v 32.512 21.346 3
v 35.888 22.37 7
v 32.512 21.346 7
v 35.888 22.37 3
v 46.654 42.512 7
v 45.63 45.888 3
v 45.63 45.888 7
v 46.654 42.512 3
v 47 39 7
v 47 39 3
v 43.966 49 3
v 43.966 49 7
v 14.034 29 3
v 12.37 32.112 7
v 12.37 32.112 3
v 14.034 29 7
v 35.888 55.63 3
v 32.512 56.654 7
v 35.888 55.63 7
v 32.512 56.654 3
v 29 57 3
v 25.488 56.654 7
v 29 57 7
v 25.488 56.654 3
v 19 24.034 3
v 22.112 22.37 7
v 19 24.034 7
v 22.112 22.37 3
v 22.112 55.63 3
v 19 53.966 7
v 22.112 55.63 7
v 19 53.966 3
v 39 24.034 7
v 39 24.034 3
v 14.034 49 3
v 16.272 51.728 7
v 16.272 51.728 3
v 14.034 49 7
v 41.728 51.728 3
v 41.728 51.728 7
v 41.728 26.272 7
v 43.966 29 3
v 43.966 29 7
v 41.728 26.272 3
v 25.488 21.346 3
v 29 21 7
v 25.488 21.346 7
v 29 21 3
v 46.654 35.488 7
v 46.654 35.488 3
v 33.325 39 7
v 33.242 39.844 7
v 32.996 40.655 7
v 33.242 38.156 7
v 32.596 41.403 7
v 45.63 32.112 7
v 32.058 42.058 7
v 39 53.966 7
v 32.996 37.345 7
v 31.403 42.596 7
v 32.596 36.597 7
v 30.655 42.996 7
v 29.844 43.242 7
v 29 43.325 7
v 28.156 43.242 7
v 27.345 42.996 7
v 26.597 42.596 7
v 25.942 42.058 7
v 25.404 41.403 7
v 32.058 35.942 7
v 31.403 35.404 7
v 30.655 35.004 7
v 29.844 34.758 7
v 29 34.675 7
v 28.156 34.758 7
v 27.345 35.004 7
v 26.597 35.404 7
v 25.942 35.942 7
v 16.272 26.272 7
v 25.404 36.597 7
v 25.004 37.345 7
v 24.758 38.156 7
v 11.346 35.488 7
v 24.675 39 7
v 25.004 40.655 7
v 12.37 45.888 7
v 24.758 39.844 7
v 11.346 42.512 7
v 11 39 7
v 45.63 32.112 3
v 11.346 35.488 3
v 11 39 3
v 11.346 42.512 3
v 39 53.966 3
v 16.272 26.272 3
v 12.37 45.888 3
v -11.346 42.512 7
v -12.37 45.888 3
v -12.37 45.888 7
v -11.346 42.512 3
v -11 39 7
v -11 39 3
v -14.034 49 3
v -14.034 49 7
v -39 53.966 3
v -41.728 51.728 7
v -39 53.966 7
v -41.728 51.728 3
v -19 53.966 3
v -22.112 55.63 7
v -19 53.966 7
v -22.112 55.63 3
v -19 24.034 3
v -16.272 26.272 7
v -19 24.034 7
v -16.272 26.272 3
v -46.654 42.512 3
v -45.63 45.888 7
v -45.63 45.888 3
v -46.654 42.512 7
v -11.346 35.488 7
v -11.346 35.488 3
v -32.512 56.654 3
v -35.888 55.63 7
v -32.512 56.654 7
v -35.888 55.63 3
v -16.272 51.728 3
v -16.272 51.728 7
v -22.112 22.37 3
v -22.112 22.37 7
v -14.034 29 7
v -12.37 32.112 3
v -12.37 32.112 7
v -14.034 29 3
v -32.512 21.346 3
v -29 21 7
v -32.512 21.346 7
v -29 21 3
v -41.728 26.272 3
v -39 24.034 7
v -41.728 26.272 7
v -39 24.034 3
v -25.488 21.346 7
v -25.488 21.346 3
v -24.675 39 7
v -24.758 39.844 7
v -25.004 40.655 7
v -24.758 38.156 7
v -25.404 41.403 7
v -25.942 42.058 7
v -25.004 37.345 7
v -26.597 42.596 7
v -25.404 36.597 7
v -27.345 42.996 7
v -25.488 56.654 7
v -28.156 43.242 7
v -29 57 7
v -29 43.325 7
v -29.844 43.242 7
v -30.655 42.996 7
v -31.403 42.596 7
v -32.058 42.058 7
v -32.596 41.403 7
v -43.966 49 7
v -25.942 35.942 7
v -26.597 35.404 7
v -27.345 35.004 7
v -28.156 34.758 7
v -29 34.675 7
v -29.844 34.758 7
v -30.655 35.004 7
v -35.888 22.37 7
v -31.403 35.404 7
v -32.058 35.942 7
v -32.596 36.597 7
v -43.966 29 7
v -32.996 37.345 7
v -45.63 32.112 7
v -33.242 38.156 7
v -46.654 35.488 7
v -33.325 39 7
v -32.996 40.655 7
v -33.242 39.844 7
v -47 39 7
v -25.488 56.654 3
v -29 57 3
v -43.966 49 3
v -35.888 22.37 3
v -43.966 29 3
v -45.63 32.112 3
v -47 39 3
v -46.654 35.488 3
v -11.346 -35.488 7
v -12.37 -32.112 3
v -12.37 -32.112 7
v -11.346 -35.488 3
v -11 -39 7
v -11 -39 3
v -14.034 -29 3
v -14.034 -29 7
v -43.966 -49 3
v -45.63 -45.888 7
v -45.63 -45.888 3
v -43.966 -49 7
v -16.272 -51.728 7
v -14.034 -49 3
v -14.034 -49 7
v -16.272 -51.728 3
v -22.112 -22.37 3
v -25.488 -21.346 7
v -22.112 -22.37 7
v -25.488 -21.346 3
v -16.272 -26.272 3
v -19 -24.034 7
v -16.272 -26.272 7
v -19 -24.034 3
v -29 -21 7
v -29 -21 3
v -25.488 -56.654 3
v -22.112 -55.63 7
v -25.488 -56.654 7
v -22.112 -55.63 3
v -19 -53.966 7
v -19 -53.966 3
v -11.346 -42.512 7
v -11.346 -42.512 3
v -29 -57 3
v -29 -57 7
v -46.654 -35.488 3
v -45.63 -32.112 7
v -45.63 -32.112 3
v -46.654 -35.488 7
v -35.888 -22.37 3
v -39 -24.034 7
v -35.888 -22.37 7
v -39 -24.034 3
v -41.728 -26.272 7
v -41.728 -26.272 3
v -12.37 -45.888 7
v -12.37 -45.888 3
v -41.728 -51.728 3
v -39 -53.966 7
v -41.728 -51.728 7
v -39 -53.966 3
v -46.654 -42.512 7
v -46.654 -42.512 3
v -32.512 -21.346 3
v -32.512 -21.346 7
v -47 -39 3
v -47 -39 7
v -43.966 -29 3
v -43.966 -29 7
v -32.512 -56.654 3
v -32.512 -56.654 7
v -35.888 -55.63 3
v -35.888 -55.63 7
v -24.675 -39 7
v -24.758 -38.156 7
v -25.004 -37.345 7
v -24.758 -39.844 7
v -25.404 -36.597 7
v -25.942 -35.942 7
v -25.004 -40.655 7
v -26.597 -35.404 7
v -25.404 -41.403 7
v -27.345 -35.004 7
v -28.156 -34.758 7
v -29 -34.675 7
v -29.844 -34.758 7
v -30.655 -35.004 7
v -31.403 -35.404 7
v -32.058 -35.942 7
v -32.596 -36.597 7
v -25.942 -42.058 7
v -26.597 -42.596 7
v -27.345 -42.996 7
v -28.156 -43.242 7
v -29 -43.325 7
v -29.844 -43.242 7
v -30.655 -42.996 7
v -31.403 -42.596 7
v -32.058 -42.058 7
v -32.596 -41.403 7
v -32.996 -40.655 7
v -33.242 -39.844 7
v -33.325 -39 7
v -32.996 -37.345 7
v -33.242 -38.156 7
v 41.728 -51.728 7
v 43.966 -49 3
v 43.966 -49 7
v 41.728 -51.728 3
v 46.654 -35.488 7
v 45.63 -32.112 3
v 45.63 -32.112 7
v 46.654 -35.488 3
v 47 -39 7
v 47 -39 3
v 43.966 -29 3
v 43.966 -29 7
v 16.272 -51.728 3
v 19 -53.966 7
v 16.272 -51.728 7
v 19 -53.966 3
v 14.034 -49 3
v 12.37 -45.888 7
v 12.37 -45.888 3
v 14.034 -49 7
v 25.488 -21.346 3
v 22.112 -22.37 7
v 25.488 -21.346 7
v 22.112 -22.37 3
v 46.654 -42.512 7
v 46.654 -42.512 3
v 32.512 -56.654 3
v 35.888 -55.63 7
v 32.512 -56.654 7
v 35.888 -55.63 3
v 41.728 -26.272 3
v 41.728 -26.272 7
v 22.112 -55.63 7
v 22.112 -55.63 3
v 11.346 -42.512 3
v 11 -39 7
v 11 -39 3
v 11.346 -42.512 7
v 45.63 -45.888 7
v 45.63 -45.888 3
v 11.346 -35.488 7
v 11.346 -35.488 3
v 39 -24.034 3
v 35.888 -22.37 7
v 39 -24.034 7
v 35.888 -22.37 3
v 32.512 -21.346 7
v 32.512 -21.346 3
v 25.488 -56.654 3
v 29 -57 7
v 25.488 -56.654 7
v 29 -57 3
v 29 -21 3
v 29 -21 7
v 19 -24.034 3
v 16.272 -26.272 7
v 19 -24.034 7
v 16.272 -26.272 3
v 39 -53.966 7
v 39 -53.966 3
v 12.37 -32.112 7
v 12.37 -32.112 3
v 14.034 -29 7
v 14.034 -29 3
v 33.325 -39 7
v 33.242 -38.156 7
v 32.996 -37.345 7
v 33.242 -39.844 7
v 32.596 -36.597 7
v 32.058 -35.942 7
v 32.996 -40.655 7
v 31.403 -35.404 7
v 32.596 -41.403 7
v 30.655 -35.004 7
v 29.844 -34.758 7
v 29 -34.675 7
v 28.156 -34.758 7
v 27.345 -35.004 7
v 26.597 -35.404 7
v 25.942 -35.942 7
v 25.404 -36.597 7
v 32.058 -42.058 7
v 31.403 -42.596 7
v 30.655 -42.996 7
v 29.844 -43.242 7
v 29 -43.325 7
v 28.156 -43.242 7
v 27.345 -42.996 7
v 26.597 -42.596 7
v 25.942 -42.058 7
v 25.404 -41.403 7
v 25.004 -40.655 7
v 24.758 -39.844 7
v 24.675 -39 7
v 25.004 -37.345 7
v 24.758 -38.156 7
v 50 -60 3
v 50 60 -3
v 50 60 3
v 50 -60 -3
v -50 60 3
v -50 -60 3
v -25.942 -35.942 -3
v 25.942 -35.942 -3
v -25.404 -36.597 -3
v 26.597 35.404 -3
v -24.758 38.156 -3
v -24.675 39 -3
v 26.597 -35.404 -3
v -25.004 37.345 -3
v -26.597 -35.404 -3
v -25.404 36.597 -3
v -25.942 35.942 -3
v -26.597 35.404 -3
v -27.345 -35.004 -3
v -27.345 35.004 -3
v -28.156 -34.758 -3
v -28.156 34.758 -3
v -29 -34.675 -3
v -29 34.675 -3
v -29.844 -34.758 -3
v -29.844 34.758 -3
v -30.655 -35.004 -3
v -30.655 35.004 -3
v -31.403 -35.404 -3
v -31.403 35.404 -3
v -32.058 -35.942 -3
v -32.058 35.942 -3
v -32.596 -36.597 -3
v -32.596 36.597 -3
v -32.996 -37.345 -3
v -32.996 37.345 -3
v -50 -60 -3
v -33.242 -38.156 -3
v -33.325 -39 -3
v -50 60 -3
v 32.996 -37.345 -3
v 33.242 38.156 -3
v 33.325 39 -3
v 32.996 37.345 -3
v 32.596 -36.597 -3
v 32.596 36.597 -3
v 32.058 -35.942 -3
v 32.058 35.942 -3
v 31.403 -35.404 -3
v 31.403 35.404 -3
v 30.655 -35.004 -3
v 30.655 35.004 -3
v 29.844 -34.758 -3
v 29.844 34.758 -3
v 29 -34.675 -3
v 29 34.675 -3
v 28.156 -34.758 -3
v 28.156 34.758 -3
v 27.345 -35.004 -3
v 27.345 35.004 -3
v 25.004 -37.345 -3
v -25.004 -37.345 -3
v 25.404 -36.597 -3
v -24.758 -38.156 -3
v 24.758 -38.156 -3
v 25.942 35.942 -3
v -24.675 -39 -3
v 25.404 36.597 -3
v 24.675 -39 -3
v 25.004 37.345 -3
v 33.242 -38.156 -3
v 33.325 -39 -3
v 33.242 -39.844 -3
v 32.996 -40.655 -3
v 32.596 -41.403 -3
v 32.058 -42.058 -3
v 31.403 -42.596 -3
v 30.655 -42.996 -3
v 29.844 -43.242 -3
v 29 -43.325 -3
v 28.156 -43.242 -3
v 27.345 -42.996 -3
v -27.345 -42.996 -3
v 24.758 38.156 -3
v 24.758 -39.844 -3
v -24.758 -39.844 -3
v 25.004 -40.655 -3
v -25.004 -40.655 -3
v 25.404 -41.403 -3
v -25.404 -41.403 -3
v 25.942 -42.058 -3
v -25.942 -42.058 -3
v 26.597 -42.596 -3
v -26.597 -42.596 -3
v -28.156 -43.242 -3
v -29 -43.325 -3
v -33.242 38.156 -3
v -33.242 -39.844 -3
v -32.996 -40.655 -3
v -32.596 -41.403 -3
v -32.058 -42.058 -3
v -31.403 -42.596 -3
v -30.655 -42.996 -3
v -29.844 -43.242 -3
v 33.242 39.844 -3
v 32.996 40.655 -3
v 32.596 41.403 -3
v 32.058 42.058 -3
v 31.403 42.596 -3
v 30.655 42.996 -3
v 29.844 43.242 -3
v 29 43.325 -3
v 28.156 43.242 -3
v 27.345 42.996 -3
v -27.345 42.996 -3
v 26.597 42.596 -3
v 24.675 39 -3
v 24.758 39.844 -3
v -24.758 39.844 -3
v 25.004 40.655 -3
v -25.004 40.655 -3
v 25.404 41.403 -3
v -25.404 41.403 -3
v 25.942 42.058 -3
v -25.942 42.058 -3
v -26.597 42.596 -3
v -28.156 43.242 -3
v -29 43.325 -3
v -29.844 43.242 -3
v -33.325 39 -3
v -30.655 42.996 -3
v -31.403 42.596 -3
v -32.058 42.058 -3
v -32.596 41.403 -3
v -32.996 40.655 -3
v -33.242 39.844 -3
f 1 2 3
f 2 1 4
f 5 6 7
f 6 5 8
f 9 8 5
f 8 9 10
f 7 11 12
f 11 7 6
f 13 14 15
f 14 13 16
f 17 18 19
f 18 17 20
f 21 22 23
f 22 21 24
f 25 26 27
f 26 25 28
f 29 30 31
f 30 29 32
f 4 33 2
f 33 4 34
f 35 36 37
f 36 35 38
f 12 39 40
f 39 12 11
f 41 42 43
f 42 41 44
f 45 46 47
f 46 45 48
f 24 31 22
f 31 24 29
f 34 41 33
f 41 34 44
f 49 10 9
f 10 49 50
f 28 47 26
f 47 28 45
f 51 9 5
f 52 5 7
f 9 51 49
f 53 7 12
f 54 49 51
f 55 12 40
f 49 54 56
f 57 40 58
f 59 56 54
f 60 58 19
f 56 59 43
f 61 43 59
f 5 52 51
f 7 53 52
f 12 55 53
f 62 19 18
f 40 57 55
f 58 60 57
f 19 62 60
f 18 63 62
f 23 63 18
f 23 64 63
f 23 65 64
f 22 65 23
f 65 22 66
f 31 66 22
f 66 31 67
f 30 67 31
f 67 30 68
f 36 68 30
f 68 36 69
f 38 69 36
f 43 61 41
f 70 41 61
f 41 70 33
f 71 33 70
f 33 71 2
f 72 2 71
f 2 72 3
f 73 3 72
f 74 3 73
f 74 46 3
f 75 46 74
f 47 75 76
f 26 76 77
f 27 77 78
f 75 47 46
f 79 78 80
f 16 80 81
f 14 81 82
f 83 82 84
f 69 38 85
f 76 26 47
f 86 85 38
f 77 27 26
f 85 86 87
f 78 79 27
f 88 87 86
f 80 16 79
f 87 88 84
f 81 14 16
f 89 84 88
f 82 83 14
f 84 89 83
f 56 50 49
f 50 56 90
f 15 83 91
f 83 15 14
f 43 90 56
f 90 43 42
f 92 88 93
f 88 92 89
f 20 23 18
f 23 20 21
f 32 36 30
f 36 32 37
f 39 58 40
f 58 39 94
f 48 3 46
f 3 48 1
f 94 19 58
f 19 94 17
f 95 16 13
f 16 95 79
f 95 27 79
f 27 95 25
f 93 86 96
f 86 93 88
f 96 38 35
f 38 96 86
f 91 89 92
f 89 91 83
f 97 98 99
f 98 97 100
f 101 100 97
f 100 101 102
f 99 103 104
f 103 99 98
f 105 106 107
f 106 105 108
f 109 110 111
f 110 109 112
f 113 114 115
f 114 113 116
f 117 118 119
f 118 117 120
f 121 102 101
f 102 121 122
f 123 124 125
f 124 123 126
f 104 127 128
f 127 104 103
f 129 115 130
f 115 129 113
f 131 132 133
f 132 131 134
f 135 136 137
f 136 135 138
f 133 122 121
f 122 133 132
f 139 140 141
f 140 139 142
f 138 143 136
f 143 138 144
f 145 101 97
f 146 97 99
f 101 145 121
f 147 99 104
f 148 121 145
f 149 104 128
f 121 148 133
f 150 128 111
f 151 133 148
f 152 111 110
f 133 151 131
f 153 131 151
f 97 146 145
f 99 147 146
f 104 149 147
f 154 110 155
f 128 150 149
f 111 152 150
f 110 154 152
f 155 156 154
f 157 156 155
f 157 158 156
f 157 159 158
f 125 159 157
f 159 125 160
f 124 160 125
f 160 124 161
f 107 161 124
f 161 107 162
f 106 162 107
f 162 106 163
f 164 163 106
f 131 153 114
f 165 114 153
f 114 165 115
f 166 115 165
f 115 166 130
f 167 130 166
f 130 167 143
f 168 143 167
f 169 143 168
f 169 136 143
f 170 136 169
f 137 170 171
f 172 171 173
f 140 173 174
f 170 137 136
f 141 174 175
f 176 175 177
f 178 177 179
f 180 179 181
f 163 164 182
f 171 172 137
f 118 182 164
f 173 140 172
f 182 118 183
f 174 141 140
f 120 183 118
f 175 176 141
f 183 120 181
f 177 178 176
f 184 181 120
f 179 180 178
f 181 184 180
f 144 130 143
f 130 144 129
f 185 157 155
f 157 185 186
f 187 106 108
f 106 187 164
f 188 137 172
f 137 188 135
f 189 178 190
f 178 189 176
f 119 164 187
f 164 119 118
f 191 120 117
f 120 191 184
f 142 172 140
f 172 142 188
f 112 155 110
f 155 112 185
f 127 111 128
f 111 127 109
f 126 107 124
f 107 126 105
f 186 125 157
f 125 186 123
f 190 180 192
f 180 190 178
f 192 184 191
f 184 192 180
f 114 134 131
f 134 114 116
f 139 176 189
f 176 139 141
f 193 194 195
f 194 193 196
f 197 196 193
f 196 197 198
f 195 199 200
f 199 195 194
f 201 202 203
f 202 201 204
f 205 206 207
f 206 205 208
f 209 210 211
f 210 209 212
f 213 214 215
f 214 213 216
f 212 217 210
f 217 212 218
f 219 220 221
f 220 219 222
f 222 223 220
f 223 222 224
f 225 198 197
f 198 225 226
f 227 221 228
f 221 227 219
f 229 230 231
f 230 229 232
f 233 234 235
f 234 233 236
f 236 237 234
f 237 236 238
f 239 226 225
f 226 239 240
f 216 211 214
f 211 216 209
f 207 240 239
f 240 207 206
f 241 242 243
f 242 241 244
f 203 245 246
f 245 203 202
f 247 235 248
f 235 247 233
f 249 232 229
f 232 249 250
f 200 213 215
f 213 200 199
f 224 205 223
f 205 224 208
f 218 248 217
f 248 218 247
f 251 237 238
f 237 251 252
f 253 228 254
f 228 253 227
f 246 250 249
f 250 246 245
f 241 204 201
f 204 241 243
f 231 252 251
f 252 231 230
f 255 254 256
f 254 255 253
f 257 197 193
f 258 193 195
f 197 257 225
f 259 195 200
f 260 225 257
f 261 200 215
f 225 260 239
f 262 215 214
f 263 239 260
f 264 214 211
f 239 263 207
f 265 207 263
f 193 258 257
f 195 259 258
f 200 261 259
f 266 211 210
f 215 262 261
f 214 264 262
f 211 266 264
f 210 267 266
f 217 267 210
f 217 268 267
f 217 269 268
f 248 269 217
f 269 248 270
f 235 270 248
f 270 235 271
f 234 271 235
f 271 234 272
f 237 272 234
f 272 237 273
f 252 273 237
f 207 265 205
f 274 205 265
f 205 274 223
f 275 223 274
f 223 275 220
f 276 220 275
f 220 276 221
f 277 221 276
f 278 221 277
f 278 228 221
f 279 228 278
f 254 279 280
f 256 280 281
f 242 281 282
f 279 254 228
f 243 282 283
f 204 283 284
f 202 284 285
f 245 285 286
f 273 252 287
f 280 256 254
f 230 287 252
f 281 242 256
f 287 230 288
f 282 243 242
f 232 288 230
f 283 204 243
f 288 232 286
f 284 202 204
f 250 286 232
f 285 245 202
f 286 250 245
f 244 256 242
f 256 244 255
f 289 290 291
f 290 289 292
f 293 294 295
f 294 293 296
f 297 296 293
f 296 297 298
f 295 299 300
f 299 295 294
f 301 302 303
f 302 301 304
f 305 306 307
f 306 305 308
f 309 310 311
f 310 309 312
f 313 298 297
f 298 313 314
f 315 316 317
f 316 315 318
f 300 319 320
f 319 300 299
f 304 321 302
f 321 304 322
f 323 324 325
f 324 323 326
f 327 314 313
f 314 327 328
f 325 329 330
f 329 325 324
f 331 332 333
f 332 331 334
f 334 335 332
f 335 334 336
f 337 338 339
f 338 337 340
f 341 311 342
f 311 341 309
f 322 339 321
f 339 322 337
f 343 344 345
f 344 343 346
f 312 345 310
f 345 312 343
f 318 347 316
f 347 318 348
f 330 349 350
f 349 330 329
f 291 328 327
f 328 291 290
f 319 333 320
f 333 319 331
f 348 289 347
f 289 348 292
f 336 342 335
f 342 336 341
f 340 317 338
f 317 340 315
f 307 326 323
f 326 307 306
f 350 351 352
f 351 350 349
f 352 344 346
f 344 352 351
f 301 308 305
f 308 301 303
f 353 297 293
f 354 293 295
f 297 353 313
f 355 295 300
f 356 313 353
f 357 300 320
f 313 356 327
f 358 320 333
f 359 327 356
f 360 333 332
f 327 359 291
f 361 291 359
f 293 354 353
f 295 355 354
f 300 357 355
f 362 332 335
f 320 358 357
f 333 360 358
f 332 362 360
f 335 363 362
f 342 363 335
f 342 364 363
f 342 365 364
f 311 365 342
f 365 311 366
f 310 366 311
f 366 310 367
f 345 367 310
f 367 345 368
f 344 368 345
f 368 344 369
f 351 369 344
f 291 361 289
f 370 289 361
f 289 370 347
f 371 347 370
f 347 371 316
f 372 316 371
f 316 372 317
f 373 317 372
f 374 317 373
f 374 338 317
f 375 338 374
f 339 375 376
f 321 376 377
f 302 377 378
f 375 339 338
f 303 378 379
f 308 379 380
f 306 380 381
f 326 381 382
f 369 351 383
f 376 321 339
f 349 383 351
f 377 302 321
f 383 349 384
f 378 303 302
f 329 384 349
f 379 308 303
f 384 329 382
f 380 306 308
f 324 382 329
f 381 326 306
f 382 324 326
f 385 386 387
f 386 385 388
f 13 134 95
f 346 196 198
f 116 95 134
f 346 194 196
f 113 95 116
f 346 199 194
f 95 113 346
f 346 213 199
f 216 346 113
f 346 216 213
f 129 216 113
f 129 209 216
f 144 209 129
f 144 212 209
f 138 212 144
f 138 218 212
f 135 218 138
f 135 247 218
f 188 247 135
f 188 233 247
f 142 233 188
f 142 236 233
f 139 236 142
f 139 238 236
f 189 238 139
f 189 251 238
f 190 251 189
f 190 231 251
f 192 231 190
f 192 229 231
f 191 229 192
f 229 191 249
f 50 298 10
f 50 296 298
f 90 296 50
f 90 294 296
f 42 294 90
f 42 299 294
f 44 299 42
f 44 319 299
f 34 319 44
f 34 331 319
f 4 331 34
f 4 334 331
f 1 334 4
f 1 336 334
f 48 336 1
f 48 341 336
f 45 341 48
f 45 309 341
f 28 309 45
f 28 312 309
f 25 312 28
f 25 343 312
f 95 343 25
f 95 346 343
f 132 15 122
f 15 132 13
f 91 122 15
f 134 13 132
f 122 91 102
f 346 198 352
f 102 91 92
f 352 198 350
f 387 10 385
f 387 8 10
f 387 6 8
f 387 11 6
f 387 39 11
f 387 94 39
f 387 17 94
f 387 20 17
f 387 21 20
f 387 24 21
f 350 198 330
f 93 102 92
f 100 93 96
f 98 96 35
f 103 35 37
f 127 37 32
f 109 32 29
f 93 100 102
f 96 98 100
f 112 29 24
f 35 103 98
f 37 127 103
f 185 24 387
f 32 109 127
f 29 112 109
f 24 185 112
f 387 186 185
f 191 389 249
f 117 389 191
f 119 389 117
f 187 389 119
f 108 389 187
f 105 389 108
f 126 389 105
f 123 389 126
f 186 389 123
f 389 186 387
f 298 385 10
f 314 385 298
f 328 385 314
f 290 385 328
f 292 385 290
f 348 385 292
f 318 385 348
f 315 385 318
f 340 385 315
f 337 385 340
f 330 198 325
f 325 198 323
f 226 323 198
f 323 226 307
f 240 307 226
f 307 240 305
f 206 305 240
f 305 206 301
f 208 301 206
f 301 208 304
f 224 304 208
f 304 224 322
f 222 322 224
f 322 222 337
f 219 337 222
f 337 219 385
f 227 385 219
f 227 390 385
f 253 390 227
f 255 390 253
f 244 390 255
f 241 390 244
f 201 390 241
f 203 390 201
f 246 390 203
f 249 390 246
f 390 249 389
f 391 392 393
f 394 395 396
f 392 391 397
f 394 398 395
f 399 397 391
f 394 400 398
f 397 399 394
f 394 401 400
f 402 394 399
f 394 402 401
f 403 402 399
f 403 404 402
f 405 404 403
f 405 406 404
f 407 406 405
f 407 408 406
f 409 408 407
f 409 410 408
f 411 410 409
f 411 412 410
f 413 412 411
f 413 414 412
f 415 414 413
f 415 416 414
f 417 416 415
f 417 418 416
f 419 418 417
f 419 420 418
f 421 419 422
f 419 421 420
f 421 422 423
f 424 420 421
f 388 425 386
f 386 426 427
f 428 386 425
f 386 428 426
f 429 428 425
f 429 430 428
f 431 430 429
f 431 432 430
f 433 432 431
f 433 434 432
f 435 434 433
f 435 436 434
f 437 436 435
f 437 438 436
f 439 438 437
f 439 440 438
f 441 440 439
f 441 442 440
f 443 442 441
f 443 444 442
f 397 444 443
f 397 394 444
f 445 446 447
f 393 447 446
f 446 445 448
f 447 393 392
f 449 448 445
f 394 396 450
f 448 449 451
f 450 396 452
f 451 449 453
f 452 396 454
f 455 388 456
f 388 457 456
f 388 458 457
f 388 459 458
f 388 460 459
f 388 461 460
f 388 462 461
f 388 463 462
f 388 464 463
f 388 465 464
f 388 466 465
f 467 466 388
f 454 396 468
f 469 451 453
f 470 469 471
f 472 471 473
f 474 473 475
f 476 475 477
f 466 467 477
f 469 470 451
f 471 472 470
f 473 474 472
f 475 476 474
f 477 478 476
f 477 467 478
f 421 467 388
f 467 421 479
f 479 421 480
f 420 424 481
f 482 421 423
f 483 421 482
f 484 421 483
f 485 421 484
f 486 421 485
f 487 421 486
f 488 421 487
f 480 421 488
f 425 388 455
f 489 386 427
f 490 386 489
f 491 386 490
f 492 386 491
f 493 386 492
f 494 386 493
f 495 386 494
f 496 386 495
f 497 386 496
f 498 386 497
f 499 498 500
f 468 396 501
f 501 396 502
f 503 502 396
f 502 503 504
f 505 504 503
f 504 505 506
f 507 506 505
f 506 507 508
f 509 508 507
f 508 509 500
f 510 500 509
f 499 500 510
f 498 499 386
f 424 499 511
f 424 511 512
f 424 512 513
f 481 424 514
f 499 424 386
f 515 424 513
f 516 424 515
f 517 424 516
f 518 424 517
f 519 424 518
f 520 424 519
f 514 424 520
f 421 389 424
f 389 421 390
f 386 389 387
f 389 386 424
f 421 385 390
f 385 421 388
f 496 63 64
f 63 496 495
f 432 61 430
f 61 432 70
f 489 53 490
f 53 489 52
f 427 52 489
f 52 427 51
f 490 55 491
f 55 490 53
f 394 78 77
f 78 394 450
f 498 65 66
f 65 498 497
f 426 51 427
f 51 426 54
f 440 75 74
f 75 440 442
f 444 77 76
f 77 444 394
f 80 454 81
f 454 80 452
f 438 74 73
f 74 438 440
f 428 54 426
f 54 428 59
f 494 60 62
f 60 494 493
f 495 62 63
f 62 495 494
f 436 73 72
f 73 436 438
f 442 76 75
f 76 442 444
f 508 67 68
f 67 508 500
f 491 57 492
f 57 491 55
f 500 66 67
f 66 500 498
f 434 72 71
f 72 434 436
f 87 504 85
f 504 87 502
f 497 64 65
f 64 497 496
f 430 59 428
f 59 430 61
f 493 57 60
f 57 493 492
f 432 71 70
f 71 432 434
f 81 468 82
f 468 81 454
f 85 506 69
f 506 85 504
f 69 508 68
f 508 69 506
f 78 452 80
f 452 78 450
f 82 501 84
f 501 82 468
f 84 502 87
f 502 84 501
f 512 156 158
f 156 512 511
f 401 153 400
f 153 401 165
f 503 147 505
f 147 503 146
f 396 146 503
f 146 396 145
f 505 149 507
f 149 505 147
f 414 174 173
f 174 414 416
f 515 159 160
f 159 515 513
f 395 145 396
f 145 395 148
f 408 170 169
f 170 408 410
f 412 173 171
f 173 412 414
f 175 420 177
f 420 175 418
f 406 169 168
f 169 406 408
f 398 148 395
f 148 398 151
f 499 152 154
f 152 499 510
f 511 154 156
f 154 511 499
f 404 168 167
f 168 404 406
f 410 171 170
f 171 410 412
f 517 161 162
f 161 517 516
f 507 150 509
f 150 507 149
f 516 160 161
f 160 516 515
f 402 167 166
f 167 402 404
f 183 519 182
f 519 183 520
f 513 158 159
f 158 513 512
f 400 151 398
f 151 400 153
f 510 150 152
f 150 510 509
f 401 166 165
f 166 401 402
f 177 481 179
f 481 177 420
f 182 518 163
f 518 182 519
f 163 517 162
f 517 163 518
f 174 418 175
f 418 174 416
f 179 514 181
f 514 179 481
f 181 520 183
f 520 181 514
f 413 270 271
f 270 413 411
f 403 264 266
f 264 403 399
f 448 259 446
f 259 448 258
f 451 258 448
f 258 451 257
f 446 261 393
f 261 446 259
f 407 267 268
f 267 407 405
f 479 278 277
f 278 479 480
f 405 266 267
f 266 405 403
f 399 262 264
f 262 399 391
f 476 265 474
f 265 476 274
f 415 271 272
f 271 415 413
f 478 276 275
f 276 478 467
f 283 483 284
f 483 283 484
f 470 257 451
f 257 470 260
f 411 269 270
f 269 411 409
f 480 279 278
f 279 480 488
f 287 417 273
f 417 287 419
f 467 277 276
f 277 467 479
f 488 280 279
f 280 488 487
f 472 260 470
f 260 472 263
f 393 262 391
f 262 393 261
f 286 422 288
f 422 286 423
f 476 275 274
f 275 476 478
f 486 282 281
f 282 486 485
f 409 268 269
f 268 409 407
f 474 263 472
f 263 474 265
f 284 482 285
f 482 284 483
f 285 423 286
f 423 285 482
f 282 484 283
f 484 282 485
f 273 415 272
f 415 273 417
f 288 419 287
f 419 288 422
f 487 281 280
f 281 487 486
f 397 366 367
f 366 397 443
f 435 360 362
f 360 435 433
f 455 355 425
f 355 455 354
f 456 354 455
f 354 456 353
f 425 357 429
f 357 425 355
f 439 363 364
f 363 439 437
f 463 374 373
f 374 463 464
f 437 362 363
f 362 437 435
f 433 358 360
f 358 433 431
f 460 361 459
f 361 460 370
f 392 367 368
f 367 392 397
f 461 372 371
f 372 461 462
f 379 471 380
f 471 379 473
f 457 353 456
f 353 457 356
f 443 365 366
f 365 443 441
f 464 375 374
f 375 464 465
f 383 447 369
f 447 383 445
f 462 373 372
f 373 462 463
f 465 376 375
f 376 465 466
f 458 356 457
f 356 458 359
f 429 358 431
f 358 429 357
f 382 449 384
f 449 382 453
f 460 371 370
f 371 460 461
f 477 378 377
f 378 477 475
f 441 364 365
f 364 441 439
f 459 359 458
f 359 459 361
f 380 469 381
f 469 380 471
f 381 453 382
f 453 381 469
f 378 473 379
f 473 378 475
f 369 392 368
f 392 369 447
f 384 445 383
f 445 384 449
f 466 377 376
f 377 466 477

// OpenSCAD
$fn = 32;

// ----------------------------------------------------------------------
// Anchor pads 100 x 120 x 10
// four corner bosses with anchor holes
// ----------------------------------------------------------------------

// --- parameters (mm) ---
plate = [100, 120, 6];   // base plate size (x, y, z)
pads = 4;                // boss count, one per corner
edge = 21;               // boss centre offset from the plate edge
boss_d = 36;             // boss diameter
boss_h = 4;              // boss height above the base plate
bore_d = 8.4;            // nominal hole diameter from the drawing
print_allowance = 0.25;  // clearance added for printing

// --- derived feature positions (mm) ---
hole_d = bore_d + print_allowance;  // = 8.65   hole diameter as printed
height = plate[2] + boss_h;         // = 10   overall height of the part
corner_x = plate[0] / 2 - edge;     // = 29   boss centre X
corner_y = plate[1] / 2 - edge;     // = 39   boss centre Y
feature_centers = [
  [corner_x, corner_y],
  [-corner_x, corner_y],
  [-corner_x, -corner_y],
  [corner_x, -corner_y]
];   // boss centres, anchor holes are drilled there

// base plate, four bosses standing on it, anchor holes all the way through
difference() {
  union() {
    cube(plate, center = true);
    for (centre = feature_centers)
      translate([centre[0], centre[1], plate[2] / 2 - 1])
        cylinder(d = boss_d, h = boss_h + 1);
  }
  for (centre = feature_centers)
    translate([centre[0], centre[1], -height])
      cylinder(d = hole_d, h = 2 * height + 2);  // through boss and plate
}
